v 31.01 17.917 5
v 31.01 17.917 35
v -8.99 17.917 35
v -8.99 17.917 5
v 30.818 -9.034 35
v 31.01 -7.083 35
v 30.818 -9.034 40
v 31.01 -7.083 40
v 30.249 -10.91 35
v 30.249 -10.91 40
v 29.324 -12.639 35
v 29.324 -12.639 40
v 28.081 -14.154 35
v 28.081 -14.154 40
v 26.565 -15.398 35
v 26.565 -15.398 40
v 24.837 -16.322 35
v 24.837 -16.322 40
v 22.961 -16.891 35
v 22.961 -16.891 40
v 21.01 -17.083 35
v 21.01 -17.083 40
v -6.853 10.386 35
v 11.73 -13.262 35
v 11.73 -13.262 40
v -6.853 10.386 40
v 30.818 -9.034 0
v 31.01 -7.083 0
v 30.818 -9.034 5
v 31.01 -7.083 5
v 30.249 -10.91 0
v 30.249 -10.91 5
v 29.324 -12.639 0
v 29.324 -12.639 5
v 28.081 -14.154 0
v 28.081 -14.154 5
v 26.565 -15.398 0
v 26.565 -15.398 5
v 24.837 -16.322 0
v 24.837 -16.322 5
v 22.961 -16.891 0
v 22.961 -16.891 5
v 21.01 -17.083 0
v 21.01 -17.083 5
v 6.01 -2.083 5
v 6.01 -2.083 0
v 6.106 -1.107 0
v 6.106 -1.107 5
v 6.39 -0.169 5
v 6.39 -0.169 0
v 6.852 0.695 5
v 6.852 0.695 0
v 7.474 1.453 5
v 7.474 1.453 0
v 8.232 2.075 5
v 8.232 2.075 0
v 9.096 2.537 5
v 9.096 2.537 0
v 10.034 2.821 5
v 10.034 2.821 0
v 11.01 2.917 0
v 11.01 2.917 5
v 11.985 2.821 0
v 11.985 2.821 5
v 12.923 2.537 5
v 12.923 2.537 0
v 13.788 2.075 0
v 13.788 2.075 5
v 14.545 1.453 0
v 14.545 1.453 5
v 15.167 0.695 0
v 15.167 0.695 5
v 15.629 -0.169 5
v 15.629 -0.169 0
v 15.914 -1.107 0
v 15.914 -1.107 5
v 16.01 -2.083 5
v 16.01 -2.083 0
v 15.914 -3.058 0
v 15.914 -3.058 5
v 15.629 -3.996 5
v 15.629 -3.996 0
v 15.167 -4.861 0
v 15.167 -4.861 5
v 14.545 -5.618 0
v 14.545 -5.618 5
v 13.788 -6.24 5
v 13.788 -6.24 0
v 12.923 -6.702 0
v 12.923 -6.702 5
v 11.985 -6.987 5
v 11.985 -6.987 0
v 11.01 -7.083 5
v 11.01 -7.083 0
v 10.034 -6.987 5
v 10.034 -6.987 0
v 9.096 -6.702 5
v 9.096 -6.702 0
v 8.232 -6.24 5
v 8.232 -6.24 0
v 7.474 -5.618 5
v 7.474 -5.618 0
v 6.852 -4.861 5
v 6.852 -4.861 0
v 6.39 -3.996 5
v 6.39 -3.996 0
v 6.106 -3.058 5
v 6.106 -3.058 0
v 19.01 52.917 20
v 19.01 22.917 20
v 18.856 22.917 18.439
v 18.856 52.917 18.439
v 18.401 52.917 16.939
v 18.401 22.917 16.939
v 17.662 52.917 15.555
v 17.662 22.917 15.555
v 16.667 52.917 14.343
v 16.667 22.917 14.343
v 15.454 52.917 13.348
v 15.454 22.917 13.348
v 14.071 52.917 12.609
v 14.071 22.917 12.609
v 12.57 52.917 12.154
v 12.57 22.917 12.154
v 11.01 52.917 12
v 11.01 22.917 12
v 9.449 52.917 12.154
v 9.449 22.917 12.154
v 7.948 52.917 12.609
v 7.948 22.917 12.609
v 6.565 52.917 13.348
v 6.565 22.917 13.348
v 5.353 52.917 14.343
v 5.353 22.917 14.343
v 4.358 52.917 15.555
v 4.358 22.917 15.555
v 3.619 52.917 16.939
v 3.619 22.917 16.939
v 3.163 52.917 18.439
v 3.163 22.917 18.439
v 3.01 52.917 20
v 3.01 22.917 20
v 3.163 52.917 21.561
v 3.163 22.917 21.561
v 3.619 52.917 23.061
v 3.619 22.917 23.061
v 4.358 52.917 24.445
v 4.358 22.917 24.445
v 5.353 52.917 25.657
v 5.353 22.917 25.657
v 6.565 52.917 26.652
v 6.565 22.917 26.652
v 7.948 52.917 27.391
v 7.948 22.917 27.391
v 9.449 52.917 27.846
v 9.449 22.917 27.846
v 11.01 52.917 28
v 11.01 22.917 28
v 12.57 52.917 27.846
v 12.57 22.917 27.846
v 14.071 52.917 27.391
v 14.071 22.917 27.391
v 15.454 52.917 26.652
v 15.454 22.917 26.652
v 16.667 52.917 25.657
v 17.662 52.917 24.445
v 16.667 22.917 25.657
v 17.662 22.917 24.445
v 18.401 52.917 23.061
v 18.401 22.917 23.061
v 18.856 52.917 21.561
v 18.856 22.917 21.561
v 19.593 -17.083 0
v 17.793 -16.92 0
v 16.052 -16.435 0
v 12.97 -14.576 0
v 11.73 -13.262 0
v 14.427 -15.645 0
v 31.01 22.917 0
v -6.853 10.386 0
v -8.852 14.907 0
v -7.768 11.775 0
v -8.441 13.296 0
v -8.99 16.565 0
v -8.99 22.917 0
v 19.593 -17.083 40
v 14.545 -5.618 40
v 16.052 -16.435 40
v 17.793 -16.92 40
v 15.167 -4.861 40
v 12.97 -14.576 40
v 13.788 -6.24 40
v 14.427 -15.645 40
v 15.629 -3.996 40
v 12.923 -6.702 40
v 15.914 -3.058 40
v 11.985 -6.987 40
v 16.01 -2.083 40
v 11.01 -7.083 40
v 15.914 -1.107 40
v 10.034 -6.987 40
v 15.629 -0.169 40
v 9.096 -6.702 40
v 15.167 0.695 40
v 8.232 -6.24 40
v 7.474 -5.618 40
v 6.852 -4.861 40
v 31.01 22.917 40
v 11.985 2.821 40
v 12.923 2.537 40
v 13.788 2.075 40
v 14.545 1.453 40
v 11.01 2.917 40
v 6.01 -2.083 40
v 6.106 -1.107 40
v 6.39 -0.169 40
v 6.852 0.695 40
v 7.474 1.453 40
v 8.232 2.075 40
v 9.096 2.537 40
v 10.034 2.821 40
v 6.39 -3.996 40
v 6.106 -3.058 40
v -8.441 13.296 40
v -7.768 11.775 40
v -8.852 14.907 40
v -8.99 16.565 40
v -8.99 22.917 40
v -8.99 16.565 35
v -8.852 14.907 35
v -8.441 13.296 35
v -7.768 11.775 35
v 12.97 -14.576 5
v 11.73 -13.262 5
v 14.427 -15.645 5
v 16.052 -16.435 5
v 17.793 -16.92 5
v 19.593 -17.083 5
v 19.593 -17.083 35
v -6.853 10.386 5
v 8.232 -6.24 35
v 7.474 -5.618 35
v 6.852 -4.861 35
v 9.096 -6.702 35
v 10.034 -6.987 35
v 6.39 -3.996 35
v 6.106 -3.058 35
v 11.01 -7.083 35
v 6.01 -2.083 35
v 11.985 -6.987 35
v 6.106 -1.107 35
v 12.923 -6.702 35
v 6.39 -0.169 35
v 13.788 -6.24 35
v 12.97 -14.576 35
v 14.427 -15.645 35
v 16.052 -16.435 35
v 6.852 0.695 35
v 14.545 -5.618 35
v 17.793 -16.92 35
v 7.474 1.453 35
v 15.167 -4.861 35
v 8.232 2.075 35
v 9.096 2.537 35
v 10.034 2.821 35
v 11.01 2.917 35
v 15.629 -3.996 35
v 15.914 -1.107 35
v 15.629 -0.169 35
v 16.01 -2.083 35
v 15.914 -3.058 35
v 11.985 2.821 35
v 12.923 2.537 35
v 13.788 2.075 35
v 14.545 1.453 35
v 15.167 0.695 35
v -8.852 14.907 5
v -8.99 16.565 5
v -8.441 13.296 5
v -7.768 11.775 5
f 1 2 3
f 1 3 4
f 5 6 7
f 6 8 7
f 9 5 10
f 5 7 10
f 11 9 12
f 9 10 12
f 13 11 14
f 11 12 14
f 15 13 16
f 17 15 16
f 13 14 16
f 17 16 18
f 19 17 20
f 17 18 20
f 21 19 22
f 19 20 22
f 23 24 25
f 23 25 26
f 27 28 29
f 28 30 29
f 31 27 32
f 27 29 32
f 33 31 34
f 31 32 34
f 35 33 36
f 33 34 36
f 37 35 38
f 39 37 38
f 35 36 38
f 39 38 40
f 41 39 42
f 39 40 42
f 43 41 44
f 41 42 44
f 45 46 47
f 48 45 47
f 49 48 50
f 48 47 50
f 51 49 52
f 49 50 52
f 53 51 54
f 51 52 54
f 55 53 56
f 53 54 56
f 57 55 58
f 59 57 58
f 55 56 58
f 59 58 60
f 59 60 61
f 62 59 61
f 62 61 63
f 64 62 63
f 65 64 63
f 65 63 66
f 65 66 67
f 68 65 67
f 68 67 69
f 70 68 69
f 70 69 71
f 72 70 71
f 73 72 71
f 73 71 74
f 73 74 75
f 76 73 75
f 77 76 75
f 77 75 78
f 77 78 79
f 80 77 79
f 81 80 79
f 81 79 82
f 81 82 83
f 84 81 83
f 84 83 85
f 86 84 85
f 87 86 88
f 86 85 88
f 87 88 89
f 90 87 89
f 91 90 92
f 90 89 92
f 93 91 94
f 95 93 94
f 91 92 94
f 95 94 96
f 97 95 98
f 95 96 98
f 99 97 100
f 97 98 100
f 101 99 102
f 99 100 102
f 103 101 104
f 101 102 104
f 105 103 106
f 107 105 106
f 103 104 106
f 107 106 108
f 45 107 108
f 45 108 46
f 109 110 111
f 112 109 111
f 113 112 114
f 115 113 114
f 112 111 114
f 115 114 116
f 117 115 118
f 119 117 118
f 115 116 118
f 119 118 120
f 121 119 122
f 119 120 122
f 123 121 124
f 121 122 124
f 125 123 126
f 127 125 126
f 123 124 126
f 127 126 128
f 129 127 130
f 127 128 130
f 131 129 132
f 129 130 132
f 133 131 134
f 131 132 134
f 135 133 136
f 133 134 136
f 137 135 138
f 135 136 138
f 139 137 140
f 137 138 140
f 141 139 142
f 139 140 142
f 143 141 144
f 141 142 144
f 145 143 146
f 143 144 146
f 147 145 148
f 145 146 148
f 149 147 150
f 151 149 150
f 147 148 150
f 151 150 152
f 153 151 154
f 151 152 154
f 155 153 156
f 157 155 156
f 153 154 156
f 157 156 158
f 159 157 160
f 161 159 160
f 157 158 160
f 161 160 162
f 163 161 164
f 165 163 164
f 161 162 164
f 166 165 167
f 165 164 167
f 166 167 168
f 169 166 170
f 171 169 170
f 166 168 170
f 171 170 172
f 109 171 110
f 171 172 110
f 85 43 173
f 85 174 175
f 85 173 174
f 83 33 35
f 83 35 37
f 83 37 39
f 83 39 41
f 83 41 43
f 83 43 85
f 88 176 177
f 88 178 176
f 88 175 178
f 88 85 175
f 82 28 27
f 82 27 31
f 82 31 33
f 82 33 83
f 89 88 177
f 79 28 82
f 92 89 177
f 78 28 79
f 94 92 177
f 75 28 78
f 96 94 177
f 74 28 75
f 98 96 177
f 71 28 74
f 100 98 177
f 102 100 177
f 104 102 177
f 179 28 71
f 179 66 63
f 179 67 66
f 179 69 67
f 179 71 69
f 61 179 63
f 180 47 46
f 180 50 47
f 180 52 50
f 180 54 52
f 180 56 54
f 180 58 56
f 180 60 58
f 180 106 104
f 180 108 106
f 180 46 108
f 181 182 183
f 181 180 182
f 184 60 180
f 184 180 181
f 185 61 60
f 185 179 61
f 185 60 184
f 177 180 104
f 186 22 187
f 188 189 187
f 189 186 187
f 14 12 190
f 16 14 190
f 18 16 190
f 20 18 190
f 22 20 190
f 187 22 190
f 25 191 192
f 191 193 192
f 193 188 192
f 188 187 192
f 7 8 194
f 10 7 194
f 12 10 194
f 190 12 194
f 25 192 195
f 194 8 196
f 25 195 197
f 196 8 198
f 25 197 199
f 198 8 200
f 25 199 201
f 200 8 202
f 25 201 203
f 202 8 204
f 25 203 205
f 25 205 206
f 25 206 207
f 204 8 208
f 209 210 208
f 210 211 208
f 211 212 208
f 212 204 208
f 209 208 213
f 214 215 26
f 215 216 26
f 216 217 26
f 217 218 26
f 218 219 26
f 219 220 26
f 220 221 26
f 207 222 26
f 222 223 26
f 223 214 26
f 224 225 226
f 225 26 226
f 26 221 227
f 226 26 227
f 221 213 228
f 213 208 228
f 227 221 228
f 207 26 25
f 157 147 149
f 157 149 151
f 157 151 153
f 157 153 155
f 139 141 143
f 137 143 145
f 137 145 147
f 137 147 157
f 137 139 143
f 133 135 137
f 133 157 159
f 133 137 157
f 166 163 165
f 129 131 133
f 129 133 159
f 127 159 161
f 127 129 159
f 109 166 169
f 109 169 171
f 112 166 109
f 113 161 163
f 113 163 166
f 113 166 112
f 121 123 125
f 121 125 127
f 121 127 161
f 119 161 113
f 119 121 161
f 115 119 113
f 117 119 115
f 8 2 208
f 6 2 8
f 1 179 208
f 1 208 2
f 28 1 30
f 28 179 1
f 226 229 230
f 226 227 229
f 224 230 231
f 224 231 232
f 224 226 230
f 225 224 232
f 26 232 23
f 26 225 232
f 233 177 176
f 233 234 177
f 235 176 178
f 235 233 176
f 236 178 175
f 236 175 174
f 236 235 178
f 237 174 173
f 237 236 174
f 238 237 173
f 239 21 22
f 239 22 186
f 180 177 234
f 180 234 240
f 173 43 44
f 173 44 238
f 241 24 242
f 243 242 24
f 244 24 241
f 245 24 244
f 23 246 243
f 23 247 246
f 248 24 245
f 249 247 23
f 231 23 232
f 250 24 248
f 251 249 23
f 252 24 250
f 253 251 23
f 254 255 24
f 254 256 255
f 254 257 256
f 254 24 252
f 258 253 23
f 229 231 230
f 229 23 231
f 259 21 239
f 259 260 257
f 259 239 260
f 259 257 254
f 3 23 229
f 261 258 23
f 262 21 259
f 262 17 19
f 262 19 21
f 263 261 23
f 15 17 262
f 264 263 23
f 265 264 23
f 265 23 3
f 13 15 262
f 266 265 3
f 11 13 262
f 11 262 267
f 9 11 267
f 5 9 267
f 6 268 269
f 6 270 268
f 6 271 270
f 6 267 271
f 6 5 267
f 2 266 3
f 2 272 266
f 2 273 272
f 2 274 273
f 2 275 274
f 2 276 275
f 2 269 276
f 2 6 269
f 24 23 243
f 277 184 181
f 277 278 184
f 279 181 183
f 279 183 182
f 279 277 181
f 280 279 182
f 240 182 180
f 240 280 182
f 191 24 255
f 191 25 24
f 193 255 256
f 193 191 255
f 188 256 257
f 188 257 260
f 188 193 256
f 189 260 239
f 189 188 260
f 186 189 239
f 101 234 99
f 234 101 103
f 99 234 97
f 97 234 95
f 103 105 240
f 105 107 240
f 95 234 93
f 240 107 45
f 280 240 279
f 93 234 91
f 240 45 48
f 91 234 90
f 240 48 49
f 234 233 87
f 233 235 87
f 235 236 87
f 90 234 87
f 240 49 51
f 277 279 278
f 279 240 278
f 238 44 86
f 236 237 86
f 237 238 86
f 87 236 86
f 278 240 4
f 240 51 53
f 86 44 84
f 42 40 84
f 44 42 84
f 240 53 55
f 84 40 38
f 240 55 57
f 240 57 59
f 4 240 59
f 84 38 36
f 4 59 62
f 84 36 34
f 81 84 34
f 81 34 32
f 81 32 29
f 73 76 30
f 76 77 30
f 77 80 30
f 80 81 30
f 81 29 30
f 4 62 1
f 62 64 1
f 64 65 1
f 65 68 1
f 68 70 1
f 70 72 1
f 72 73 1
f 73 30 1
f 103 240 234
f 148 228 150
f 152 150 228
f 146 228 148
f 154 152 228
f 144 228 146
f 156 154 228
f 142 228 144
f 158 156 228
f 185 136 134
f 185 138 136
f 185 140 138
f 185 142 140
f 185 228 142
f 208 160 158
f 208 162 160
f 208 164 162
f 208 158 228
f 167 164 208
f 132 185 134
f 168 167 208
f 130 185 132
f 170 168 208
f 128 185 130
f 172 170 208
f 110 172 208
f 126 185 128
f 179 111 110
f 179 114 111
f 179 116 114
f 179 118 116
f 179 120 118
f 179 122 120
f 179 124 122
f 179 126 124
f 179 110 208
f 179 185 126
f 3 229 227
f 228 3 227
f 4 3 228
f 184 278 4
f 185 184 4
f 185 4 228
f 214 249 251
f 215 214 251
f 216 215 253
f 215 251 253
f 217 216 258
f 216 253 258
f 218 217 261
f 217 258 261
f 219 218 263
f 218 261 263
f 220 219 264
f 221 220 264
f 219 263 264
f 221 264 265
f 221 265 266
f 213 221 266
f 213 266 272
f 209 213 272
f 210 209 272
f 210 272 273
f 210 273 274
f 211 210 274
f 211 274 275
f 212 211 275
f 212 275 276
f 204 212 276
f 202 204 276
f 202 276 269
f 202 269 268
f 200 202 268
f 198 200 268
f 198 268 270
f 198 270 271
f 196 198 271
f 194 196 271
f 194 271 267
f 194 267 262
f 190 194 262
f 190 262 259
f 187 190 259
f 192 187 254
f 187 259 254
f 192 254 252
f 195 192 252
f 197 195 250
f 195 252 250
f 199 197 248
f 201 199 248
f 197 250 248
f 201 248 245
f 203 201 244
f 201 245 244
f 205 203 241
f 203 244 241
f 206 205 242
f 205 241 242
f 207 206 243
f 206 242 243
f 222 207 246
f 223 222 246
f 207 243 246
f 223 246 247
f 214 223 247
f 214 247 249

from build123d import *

# Parameters (mm, degrees)
DODANIE_WYCI_GNI_CIE1_DEPTH = 40
SZKIC2_W                    = 30
SZKIC2_H                    = 35
WYTNIJ_WYCI_GNI_CIE1_DEPTH  = 40
SZKIC3_R                    = 5
WYTNIJ_WYCI_GNI_CIE2_DEPTH  = 40
ZAOKR_GLENIE1_R             = 10
SZKIC4_R                    = 8
DODANIE_WYCI_GNI_CIE2_DEPTH = 30


with BuildPart() as part:
    # Szkic1 → Dodanie-wyciągnięcie1 (new body)
    with BuildSketch(Plane.XY):
        Polygon((-8.990228013, 22.917176047), (31.009771987, 22.917176047), (31.009771987, -17.082823953), (14.732595321, -17.082823953), (-8.990228013, 13.105888901), align=None)
    extrude(amount=DODANIE_WYCI_GNI_CIE1_DEPTH)

    # Szkic2 → Wytnij-wyciągnięcie1 (cut)
    with BuildSketch(Plane(origin=(31.009771987, 0, 0), x_dir=(0, 0, -1), z_dir=(1, 0, 0))):
        with Locations((-20, 0.417176047)):
            Rectangle(SZKIC2_W, SZKIC2_H)
    extrude(amount=-WYTNIJ_WYCI_GNI_CIE1_DEPTH, mode=Mode.SUBTRACT)

    # Szkic3 → Wytnij-wyciągnięcie2 (cut)
    with BuildSketch(Plane(origin=(0, 0, 0), x_dir=(-1, 0, 0), z_dir=(0, 0, -1))):
        with Locations((-11.009771987, -2.082823953)):
            Circle(SZKIC3_R)
    extrude(amount=-WYTNIJ_WYCI_GNI_CIE2_DEPTH, mode=Mode.SUBTRACT)

    # Zaokrąglenie1
    zaokr_glenie1_edges = [part.edges().sort_by_distance(p)[0] for p in [
        (31.009771987, -17.082823953, 2.5),
        (14.732595321, -17.082823953, 2.5),
        (-8.990228013, 13.105888901, 2.5),
        (31.009771987, -17.082823953, 37.5),
        (14.732595321, -17.082823953, 37.5),
        (-8.990228013, 13.105888901, 37.5),
    ]]
    fillet(zaokr_glenie1_edges, radius=ZAOKR_GLENIE1_R)

    # Szkic4 → Dodanie-wyciągnięcie2 (add)
    with BuildSketch(Plane(origin=(0, 22.917176047, 0), x_dir=(1, 0, 0), z_dir=(0, 1, 0))):
        with Locations((11.009771987, -20)):
            Circle(SZKIC4_R)
    extrude(amount=DODANIE_WYCI_GNI_CIE2_DEPTH)


solid = part.part
